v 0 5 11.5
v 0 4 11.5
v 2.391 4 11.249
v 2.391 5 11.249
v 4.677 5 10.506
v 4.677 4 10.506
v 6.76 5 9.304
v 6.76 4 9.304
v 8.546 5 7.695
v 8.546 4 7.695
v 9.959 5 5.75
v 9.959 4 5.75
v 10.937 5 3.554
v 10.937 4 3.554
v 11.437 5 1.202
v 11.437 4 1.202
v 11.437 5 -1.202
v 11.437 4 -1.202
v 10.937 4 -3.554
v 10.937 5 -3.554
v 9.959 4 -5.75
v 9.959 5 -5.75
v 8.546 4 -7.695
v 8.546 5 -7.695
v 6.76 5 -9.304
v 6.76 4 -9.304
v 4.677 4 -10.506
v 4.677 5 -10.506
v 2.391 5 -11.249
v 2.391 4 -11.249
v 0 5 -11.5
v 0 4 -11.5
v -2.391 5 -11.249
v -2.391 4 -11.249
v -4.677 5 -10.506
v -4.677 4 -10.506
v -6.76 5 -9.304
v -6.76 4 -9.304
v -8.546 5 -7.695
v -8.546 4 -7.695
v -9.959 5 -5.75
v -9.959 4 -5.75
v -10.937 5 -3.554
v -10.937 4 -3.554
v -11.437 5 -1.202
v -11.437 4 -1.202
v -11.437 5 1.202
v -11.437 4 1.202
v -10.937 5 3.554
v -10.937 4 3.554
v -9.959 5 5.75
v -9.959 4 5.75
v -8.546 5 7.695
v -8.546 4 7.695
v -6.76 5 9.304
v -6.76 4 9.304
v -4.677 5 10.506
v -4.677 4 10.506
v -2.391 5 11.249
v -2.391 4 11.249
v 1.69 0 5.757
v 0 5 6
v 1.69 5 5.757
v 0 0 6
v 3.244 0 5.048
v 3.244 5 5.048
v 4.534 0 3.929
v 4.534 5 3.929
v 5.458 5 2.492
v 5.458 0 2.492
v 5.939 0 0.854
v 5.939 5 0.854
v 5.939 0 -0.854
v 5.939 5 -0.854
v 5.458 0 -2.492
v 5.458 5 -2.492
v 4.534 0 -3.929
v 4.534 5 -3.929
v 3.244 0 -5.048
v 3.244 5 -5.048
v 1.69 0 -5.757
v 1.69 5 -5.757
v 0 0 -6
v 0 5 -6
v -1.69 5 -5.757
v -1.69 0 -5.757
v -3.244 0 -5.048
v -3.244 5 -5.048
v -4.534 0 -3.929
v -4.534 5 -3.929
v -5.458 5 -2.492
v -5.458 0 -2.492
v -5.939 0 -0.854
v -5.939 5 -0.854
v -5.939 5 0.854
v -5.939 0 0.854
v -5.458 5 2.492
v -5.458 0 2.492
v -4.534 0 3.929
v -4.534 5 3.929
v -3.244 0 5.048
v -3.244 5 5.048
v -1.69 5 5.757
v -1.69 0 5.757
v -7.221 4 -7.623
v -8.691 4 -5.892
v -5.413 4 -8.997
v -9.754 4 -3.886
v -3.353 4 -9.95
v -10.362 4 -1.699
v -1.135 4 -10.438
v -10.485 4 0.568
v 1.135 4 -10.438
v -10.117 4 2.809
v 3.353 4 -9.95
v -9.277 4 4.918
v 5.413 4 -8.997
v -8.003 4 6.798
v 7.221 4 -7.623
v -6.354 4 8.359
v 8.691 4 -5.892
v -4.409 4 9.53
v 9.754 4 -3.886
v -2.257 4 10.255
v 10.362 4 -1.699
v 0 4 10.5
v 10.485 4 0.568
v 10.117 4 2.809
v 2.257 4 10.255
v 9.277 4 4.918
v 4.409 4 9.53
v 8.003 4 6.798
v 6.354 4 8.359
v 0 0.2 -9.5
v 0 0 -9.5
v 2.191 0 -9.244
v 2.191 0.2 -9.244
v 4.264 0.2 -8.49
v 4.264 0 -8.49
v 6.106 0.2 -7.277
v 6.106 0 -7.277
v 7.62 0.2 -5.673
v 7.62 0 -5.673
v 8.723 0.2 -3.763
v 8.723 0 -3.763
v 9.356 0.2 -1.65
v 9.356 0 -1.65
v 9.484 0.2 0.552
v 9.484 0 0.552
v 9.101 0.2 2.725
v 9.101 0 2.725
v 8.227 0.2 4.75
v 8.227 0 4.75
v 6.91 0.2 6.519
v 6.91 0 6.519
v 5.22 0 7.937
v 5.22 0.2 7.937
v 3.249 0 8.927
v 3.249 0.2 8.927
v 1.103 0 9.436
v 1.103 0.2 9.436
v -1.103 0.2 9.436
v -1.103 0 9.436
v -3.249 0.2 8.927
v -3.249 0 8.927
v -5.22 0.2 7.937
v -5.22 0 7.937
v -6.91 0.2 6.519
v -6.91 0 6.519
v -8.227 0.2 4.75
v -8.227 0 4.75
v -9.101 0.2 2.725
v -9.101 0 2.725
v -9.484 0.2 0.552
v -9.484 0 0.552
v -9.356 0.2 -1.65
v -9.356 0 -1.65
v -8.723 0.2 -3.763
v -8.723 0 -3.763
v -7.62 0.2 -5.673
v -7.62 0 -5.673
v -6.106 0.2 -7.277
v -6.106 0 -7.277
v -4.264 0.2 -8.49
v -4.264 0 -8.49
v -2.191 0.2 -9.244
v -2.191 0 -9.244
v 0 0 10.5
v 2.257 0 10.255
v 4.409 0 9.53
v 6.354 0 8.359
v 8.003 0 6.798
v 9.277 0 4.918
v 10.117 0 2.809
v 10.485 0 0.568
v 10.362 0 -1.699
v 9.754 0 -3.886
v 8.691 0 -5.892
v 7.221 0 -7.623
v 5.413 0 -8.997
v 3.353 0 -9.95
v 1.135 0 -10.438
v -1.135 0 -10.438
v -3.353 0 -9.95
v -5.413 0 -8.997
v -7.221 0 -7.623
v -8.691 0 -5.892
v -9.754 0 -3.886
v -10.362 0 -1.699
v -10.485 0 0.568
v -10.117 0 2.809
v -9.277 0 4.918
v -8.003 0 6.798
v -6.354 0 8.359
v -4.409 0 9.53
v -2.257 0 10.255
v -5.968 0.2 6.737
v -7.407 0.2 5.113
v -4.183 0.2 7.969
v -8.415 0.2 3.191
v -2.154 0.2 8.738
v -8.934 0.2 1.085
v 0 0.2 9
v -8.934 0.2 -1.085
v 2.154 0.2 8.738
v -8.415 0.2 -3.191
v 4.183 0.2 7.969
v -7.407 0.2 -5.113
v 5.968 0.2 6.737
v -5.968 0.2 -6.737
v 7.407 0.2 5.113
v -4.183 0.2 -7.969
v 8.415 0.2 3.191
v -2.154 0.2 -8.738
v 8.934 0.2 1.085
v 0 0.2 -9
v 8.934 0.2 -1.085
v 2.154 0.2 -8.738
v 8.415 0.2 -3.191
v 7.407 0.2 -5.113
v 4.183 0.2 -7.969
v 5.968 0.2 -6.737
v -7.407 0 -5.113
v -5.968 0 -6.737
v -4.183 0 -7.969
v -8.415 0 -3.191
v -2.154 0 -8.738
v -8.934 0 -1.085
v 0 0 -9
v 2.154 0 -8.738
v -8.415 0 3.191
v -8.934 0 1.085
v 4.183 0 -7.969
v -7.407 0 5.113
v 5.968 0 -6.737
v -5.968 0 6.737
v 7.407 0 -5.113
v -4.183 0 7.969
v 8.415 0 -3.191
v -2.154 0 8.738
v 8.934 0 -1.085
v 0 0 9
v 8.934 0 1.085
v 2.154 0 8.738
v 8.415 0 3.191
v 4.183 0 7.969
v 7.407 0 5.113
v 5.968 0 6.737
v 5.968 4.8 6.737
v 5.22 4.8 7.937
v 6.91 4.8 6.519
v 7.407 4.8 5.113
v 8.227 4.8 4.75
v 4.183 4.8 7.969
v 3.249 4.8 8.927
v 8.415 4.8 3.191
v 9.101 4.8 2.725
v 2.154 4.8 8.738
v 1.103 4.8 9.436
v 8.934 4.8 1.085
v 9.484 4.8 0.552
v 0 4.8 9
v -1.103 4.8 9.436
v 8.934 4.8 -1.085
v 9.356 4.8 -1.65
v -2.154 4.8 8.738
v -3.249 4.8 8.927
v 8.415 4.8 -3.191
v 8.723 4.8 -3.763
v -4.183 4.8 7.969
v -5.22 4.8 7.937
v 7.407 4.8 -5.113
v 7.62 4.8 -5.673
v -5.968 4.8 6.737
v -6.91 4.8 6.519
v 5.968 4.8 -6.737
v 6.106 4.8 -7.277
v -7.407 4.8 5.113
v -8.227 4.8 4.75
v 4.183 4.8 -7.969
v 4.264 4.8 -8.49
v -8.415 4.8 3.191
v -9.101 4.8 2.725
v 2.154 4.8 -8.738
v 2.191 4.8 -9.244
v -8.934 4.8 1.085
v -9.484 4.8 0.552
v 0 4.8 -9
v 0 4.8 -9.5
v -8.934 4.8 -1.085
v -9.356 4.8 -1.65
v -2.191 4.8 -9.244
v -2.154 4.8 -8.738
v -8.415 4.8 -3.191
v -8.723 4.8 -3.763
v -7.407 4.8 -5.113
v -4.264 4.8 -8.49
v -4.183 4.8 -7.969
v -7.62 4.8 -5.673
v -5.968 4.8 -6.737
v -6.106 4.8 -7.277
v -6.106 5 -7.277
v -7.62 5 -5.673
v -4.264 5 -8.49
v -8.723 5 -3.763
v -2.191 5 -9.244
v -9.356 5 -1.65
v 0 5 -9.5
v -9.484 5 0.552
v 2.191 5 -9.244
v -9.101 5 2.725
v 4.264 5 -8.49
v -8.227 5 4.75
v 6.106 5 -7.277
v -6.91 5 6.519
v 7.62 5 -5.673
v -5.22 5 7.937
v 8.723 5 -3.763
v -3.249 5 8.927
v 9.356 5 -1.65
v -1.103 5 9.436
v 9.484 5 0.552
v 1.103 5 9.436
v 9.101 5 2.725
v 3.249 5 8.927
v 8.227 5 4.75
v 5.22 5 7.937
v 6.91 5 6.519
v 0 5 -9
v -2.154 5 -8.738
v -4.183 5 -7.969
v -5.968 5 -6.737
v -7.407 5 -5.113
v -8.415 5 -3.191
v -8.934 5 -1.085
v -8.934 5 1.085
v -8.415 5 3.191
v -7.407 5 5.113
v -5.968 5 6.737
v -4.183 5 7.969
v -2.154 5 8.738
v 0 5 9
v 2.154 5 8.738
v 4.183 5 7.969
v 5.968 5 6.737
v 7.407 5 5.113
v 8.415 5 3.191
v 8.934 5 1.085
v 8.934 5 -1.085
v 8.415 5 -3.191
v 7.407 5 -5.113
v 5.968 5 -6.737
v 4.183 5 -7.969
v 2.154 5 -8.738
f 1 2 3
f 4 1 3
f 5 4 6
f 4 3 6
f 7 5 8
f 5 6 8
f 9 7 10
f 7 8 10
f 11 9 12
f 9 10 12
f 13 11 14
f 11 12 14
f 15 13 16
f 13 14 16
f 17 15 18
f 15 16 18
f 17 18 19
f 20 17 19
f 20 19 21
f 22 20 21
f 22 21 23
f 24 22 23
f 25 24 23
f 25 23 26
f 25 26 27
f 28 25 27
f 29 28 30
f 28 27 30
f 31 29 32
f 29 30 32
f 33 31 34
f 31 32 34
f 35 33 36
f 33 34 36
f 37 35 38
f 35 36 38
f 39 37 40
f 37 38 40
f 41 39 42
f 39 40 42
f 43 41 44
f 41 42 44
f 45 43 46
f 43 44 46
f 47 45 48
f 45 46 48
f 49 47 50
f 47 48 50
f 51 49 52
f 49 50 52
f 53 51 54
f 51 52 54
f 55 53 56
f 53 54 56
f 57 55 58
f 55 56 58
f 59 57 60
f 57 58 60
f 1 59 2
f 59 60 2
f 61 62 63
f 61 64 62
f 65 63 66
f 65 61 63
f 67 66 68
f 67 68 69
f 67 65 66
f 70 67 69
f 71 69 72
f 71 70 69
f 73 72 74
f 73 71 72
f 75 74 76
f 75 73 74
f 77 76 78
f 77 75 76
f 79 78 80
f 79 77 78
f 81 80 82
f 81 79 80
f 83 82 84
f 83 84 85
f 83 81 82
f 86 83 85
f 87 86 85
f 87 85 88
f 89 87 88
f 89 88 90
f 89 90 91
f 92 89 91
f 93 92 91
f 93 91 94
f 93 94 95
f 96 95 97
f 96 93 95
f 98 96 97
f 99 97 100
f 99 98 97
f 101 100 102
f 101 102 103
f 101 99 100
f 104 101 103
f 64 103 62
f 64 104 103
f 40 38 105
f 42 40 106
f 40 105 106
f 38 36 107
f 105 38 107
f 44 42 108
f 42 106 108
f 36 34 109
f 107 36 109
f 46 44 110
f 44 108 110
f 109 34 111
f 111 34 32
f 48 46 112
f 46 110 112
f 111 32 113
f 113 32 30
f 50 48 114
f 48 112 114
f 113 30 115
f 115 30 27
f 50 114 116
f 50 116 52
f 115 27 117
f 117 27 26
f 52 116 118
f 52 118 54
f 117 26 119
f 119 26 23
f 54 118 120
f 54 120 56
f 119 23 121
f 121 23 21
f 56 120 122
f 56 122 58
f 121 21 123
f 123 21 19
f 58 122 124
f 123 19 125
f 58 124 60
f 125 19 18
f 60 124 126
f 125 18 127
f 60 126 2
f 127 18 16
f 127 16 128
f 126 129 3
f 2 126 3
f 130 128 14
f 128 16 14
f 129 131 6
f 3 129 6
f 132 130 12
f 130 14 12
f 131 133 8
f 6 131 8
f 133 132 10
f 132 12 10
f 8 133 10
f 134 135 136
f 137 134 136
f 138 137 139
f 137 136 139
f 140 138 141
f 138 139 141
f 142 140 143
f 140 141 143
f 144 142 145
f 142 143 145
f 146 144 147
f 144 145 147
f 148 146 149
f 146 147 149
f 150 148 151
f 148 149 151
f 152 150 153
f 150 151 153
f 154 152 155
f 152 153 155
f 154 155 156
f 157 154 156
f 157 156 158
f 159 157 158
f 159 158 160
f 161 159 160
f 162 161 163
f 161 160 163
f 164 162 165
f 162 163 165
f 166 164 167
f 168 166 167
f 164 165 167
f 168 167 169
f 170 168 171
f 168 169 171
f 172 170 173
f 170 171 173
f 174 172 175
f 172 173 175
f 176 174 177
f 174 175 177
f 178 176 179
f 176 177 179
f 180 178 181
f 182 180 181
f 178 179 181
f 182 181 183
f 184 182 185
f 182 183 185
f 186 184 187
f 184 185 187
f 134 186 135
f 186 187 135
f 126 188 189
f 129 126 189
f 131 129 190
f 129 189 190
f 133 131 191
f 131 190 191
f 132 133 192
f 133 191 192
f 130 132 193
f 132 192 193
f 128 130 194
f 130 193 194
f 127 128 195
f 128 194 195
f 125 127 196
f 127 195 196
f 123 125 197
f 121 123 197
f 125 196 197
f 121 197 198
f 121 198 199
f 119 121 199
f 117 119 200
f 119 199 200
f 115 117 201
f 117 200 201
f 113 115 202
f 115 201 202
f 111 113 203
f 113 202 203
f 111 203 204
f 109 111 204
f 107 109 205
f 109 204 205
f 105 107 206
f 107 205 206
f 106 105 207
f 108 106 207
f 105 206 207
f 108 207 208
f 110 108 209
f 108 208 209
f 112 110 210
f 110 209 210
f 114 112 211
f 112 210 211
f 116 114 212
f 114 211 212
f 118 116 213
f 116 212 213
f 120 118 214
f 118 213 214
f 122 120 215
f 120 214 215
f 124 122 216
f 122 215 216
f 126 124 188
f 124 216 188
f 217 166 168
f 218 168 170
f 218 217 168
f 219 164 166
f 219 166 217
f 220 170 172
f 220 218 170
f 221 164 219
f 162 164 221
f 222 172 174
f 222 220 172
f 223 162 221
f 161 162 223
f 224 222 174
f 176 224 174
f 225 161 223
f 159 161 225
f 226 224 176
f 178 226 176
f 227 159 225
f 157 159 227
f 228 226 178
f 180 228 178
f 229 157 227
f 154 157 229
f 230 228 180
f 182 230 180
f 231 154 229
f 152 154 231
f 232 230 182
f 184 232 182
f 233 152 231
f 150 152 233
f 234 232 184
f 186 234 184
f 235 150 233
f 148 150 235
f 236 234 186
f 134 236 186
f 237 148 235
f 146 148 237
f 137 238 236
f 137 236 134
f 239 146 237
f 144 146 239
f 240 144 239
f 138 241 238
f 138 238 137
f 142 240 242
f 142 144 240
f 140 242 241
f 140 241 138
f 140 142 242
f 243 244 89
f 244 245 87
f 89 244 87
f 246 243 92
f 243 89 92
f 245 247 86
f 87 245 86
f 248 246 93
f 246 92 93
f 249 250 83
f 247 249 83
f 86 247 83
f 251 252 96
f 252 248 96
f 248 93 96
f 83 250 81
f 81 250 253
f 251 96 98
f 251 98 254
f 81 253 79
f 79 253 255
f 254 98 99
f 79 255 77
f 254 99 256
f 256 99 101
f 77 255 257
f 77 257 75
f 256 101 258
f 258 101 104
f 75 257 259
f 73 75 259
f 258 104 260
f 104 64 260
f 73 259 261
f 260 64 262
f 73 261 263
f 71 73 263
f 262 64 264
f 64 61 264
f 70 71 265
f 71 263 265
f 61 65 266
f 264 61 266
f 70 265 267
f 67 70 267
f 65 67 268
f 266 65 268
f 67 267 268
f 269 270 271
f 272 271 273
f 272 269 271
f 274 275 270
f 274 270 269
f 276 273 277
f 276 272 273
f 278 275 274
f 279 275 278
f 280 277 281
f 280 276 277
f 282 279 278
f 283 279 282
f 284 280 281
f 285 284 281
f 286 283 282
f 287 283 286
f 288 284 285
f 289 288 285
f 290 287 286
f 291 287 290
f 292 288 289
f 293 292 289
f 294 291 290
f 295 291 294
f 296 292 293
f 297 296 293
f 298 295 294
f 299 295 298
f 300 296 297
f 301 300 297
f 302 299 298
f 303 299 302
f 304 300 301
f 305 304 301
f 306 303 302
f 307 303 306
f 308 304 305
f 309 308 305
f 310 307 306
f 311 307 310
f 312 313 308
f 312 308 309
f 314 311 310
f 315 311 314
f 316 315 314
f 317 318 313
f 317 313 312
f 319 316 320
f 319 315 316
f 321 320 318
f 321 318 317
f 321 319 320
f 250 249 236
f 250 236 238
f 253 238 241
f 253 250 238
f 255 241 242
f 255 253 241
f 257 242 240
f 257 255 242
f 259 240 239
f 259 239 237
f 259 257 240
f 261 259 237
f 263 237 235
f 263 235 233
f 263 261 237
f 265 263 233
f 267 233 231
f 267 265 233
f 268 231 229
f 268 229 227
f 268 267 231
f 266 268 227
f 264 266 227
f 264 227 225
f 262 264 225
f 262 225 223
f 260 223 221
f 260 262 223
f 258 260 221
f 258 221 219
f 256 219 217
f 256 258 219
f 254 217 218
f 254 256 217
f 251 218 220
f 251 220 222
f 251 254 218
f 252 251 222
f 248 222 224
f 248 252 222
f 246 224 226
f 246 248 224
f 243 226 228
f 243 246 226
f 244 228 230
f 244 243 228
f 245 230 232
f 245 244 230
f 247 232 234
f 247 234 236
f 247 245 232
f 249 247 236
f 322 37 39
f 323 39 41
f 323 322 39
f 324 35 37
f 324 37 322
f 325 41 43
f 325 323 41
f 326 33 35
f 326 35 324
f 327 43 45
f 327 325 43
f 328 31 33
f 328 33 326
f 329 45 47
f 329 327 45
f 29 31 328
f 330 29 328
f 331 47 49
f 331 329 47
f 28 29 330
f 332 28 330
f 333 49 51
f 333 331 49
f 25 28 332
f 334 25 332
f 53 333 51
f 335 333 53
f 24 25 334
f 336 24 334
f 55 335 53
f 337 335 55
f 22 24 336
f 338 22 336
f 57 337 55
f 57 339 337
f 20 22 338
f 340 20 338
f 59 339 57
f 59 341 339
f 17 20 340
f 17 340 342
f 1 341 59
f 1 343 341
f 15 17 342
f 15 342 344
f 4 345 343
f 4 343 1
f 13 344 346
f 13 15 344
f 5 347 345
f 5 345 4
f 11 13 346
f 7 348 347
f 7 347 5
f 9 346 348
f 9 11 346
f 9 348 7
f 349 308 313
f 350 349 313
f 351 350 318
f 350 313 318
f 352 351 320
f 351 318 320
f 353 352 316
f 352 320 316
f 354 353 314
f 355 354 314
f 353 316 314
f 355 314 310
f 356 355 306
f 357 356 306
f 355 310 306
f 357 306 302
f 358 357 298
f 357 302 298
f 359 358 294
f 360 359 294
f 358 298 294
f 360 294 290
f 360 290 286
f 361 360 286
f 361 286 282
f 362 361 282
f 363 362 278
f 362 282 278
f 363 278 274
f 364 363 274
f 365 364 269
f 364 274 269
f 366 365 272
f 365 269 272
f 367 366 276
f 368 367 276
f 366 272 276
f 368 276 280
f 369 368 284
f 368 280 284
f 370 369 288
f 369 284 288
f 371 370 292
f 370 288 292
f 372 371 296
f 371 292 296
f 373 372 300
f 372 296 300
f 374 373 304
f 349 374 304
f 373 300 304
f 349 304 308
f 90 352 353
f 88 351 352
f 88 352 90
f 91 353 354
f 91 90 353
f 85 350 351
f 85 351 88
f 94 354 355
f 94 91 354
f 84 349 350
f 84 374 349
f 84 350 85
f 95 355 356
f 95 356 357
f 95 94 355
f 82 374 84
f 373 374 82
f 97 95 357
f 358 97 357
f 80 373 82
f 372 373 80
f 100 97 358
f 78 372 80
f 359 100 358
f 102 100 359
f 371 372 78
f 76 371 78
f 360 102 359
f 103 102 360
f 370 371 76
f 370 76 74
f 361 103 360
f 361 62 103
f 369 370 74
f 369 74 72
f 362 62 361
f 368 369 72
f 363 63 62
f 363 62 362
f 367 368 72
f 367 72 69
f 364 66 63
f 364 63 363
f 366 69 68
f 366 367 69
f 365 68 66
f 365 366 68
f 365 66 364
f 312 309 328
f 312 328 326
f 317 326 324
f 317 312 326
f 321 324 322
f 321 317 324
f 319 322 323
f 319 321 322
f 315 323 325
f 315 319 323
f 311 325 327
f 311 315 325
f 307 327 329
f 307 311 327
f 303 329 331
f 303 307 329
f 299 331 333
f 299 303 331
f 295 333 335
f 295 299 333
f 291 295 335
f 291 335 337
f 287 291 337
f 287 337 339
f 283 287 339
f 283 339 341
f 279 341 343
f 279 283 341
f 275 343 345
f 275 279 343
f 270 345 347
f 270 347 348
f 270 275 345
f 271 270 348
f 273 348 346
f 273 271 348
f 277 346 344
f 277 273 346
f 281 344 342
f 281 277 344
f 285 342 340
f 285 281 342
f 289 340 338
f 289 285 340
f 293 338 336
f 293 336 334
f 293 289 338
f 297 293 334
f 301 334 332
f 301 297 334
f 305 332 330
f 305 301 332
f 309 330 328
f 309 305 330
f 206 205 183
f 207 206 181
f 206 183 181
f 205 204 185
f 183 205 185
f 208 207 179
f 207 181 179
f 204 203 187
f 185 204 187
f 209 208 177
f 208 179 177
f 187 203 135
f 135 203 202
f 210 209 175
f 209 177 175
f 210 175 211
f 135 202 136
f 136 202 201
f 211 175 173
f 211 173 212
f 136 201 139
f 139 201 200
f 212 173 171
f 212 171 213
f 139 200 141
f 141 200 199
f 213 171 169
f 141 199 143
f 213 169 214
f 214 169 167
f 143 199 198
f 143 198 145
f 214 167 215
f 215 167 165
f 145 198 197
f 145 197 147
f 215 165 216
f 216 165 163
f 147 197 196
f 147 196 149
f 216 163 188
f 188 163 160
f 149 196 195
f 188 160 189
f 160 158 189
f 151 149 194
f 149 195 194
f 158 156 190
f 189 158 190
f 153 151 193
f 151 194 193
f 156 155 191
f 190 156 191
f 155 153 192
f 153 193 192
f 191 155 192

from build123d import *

# Parameters (mm, degrees)
SKETCH_1_R          = 10.5
SKETCH_1_R_2        = 6
EXTRUDE_1_DEPTH     = 4
SKETCH_2_R          = 11.5
SKETCH_2_R_2        = 6
EXTRUDE_2_DEPTH     = 1
SKETCH_3_R          = 9.5
SKETCH_3_R_2        = 9
CUT_EXTRUDE_1_DEPTH = 0.2
CUT_EXTRUDE_START   = -0.2
SKETCH_4_R          = 9.5
SKETCH_4_R_2        = 9
CUT_EXTRUDE_2_DEPTH = 0.2


with BuildPart() as part:
    # 草图1 → 凸台-拉伸1 (new body)
    with BuildSketch(Plane(origin=(0, 0, 0), x_dir=(1, 0, 0), z_dir=(0, 1, 0))):
        with Locations(Location((0, 0, 0), (0, 0, 270))):
            Circle(SKETCH_1_R)
        with Locations(Location((0, 0, 0), (0, 0, 270))):
            Circle(SKETCH_1_R_2, mode=Mode.SUBTRACT)
    extrude(amount=EXTRUDE_1_DEPTH)

    # 草图2 → 凸台-拉伸2 (add)
    with BuildSketch(Plane(origin=(0, 4, 0), x_dir=(1, 0, 0), z_dir=(0, 1, 0))):
        with Locations(Location((0, 0, 0), (0, 0, 270))):
            Circle(SKETCH_2_R)
        with Locations(Location((0, 0, 0), (0, 0, 270))):
            Circle(SKETCH_2_R_2, mode=Mode.SUBTRACT)
    extrude(amount=EXTRUDE_2_DEPTH)

    # 草图3 → 切除-拉伸1 (cut)
    with BuildSketch(Plane.XZ):
        with Locations(Location((0, 0, 0), (0, 0, 270))):
            Circle(SKETCH_3_R)
        with Locations(Location((0, 0, 0), (0, 0, 270))):
            Circle(SKETCH_3_R_2, mode=Mode.SUBTRACT)
    extrude(amount=-CUT_EXTRUDE_1_DEPTH, mode=Mode.SUBTRACT)

    # 草图4 → 切除-拉伸2 (cut)
    with BuildSketch(Plane(origin=(0, 5, 0), x_dir=(1, 0, 0), z_dir=(0, 1, 0)).offset(CUT_EXTRUDE_START)):
        with Locations(Location((0, 0, 0), (0, 0, 90))):
            Circle(SKETCH_4_R)
        with Locations(Location((0, 0, 0), (0, 0, 90))):
            Circle(SKETCH_4_R_2, mode=Mode.SUBTRACT)
    extrude(amount=CUT_EXTRUDE_2_DEPTH, mode=Mode.SUBTRACT)


solid = part.part
